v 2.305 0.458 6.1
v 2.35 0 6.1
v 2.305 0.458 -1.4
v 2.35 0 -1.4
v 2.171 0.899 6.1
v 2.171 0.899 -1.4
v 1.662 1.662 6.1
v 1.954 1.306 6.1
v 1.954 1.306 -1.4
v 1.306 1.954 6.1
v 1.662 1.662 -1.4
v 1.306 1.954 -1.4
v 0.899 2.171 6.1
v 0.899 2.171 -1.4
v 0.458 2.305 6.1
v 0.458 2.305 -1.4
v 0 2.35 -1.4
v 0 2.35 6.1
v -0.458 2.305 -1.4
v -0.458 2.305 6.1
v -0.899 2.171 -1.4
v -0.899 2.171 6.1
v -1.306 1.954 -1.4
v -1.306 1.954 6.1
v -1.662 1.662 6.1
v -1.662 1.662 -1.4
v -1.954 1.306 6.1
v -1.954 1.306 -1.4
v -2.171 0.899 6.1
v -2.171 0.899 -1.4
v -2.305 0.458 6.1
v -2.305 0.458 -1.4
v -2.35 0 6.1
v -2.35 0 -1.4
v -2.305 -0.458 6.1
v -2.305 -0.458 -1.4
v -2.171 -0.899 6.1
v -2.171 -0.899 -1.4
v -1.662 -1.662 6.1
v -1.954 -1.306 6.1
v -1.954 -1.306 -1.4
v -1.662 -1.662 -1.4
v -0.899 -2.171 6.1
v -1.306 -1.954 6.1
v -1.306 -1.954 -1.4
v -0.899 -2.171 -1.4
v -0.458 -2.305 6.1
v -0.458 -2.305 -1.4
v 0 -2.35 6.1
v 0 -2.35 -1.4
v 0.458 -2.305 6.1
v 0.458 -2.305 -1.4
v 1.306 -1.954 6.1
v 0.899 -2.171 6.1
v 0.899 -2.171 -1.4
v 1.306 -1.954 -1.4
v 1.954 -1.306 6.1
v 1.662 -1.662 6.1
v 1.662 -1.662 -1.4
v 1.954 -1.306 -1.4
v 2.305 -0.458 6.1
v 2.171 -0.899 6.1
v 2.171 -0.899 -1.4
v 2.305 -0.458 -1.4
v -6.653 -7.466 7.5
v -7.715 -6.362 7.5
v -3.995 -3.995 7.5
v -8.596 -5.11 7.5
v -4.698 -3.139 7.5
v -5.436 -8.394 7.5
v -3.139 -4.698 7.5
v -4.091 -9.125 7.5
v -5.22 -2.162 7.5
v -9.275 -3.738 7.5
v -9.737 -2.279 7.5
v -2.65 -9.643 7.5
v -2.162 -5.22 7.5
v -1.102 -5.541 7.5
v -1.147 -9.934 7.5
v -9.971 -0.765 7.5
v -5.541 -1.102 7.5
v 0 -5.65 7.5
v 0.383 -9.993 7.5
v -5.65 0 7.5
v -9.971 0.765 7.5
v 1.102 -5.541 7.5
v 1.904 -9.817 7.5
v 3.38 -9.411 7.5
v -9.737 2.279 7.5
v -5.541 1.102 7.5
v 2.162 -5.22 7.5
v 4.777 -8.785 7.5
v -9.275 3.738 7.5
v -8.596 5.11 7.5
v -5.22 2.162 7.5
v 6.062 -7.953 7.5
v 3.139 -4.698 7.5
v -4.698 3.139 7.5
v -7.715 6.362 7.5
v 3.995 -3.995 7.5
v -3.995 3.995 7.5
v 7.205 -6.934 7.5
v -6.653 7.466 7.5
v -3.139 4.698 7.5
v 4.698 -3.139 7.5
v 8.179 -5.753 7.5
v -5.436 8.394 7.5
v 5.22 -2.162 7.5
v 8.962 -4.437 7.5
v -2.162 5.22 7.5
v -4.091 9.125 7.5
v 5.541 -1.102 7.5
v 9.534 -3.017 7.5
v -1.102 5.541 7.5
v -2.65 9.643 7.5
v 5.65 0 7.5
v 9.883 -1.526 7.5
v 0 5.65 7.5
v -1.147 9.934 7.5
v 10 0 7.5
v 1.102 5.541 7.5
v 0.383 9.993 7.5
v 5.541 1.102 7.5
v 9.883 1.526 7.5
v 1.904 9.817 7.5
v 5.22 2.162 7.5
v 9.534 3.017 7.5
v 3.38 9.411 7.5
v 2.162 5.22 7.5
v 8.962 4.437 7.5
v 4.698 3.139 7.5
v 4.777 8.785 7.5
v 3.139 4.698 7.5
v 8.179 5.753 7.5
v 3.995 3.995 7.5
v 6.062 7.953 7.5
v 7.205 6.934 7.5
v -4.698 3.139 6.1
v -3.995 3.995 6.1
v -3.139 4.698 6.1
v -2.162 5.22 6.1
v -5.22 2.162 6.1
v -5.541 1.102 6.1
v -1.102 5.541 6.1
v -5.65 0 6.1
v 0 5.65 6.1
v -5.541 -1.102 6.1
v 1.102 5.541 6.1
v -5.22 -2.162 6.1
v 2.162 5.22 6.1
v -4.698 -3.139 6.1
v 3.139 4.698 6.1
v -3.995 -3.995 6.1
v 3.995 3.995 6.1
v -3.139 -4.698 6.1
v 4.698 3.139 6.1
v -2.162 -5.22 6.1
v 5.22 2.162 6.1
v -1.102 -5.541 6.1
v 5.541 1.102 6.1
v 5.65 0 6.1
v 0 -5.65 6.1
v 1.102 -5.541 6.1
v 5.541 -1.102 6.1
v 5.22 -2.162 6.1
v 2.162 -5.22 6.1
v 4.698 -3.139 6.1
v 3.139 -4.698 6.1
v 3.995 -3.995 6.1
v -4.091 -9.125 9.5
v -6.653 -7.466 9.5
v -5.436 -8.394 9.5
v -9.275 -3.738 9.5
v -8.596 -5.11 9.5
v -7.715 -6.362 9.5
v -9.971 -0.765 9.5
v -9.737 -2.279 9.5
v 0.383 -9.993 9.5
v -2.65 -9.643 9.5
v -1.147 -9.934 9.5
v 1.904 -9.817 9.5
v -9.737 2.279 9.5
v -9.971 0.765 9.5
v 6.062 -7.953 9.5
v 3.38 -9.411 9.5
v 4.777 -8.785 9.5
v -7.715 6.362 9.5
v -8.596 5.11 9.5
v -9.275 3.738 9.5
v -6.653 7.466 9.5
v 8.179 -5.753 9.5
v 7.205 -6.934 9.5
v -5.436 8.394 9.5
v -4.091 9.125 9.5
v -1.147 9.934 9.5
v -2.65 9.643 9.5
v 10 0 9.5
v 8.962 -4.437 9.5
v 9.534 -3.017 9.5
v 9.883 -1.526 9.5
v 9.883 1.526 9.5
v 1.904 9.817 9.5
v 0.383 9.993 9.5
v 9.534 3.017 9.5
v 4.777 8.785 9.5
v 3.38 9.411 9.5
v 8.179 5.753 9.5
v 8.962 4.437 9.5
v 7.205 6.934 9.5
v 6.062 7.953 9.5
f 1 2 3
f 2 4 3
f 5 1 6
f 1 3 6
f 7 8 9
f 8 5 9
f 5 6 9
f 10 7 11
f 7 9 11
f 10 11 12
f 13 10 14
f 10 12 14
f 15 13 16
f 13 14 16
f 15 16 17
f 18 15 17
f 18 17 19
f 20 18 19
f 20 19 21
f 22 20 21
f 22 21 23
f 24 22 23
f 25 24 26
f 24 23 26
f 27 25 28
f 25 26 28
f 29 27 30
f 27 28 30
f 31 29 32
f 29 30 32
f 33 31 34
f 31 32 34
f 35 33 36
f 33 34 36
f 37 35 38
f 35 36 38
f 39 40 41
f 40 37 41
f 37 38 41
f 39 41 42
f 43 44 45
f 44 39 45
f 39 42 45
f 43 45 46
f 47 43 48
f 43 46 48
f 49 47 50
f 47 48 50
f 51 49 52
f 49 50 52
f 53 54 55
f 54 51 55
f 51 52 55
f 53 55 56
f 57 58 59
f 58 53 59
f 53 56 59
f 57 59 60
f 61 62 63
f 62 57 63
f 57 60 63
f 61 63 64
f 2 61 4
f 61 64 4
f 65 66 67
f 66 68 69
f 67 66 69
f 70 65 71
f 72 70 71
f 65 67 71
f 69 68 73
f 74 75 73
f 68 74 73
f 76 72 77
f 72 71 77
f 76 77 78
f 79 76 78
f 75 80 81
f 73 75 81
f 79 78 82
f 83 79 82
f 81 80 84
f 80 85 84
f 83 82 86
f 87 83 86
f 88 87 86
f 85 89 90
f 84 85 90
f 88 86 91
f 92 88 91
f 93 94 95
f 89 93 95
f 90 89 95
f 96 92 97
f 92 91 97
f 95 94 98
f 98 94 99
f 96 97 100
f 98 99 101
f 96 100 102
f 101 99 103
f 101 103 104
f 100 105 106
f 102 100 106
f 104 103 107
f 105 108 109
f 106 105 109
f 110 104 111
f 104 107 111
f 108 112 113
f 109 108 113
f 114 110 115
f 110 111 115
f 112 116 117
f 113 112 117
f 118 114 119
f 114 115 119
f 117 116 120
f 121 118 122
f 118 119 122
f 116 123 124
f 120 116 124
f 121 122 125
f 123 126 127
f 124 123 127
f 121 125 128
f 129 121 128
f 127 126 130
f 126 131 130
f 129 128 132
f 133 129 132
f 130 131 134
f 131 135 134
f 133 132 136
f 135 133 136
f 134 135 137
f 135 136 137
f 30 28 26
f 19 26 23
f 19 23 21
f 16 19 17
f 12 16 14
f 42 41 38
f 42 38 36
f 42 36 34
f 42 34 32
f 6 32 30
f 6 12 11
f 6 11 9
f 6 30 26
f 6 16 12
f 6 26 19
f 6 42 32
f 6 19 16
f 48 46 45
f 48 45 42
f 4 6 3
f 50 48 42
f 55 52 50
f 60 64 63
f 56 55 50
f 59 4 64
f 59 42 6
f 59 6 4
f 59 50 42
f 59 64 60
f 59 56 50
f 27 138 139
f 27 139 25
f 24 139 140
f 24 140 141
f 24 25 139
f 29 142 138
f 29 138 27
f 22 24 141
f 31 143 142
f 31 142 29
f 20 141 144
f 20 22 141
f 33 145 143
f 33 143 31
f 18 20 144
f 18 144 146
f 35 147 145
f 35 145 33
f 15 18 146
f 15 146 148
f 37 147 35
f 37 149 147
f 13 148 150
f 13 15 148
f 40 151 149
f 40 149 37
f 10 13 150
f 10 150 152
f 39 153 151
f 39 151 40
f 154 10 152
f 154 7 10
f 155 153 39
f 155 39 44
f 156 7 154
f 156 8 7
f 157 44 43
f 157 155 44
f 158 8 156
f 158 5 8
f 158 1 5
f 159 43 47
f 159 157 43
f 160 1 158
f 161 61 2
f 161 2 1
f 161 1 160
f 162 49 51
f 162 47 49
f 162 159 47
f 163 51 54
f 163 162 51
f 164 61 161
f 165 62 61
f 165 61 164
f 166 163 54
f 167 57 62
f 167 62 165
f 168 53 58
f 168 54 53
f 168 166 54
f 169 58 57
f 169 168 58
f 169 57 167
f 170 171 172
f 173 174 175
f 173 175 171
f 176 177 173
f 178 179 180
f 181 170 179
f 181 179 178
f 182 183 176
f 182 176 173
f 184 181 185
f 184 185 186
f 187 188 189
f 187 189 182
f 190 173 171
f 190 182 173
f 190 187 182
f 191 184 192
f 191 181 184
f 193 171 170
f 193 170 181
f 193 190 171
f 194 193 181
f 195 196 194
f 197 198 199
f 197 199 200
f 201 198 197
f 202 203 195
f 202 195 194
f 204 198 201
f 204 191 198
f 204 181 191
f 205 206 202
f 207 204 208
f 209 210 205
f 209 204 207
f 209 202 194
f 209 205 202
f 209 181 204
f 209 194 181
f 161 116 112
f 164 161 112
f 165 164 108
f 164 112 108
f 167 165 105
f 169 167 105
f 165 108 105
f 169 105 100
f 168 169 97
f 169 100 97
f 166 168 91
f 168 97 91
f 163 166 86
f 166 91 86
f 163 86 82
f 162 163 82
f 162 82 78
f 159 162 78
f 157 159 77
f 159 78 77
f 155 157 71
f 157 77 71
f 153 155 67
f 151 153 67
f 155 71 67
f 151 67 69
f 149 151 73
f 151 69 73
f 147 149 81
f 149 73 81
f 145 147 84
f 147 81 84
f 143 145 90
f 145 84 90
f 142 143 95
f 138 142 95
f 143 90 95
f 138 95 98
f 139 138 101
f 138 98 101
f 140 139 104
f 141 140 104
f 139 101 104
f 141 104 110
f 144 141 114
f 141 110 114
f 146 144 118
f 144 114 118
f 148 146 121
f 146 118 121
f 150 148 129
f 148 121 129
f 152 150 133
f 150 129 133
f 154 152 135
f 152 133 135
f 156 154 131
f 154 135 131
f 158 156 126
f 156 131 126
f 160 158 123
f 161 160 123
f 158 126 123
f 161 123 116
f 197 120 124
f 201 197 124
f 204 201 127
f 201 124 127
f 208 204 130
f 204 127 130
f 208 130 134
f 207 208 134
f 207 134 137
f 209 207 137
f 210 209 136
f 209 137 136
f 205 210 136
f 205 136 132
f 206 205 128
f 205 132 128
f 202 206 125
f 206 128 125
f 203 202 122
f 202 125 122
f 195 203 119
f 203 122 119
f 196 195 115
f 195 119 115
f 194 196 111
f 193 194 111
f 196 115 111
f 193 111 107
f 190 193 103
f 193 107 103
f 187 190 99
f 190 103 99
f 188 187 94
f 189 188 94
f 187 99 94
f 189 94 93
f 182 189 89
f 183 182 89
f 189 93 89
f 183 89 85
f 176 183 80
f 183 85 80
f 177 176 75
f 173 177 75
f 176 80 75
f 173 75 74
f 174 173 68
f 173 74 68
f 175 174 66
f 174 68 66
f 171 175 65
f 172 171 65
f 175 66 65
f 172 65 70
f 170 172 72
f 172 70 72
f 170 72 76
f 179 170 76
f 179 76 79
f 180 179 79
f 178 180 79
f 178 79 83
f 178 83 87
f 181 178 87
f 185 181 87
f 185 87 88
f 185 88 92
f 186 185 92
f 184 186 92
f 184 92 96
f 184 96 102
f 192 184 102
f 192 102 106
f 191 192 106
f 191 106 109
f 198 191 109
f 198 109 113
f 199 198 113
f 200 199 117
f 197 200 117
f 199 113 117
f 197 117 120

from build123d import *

# Parameters (mm, degrees)
F0_R       = 2.35
F1_DEPTH   = 7.5
F2_R       = 10
F3_DEPTH   = 2
F4_R       = 5.65
F1_FACE1_R = 2.35
F5_DEPTH   = 1.4


with BuildPart() as f1:
    # F0 (on Top) → F1 (new body)
    with BuildSketch(Plane.XY):
        Circle(F0_R)
    extrude(amount=F1_DEPTH)

    # F2 (on face) → F3 (join)
    with BuildSketch(Plane.XY.offset(7.5)):
        Circle(F2_R)
    extrude(amount=F3_DEPTH)

    # F4 (on face) + F1_face1 (on face) → F5 (join)
    with BuildSketch(Plane(origin=(0, 0, 7.5), x_dir=(1, 0, 0), z_dir=(0, 0, -1))):
        Circle(F4_R)
    with BuildSketch(Plane(origin=(0, 0, 0), x_dir=(1, 0, 0), z_dir=(0, 0, -1))):
        Circle(F1_FACE1_R)
    extrude(amount=F5_DEPTH)


solid = f1.part
